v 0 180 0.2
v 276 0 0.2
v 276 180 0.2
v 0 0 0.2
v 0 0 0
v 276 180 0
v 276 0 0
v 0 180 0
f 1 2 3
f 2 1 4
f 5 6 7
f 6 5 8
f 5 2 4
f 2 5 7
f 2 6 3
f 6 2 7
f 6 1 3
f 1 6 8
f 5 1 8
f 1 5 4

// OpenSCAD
$fa=4; $fs=0.4;
color("#000000") translate([0.000,0.000,0.000]) cube([276.000,180.000,0.200]);
